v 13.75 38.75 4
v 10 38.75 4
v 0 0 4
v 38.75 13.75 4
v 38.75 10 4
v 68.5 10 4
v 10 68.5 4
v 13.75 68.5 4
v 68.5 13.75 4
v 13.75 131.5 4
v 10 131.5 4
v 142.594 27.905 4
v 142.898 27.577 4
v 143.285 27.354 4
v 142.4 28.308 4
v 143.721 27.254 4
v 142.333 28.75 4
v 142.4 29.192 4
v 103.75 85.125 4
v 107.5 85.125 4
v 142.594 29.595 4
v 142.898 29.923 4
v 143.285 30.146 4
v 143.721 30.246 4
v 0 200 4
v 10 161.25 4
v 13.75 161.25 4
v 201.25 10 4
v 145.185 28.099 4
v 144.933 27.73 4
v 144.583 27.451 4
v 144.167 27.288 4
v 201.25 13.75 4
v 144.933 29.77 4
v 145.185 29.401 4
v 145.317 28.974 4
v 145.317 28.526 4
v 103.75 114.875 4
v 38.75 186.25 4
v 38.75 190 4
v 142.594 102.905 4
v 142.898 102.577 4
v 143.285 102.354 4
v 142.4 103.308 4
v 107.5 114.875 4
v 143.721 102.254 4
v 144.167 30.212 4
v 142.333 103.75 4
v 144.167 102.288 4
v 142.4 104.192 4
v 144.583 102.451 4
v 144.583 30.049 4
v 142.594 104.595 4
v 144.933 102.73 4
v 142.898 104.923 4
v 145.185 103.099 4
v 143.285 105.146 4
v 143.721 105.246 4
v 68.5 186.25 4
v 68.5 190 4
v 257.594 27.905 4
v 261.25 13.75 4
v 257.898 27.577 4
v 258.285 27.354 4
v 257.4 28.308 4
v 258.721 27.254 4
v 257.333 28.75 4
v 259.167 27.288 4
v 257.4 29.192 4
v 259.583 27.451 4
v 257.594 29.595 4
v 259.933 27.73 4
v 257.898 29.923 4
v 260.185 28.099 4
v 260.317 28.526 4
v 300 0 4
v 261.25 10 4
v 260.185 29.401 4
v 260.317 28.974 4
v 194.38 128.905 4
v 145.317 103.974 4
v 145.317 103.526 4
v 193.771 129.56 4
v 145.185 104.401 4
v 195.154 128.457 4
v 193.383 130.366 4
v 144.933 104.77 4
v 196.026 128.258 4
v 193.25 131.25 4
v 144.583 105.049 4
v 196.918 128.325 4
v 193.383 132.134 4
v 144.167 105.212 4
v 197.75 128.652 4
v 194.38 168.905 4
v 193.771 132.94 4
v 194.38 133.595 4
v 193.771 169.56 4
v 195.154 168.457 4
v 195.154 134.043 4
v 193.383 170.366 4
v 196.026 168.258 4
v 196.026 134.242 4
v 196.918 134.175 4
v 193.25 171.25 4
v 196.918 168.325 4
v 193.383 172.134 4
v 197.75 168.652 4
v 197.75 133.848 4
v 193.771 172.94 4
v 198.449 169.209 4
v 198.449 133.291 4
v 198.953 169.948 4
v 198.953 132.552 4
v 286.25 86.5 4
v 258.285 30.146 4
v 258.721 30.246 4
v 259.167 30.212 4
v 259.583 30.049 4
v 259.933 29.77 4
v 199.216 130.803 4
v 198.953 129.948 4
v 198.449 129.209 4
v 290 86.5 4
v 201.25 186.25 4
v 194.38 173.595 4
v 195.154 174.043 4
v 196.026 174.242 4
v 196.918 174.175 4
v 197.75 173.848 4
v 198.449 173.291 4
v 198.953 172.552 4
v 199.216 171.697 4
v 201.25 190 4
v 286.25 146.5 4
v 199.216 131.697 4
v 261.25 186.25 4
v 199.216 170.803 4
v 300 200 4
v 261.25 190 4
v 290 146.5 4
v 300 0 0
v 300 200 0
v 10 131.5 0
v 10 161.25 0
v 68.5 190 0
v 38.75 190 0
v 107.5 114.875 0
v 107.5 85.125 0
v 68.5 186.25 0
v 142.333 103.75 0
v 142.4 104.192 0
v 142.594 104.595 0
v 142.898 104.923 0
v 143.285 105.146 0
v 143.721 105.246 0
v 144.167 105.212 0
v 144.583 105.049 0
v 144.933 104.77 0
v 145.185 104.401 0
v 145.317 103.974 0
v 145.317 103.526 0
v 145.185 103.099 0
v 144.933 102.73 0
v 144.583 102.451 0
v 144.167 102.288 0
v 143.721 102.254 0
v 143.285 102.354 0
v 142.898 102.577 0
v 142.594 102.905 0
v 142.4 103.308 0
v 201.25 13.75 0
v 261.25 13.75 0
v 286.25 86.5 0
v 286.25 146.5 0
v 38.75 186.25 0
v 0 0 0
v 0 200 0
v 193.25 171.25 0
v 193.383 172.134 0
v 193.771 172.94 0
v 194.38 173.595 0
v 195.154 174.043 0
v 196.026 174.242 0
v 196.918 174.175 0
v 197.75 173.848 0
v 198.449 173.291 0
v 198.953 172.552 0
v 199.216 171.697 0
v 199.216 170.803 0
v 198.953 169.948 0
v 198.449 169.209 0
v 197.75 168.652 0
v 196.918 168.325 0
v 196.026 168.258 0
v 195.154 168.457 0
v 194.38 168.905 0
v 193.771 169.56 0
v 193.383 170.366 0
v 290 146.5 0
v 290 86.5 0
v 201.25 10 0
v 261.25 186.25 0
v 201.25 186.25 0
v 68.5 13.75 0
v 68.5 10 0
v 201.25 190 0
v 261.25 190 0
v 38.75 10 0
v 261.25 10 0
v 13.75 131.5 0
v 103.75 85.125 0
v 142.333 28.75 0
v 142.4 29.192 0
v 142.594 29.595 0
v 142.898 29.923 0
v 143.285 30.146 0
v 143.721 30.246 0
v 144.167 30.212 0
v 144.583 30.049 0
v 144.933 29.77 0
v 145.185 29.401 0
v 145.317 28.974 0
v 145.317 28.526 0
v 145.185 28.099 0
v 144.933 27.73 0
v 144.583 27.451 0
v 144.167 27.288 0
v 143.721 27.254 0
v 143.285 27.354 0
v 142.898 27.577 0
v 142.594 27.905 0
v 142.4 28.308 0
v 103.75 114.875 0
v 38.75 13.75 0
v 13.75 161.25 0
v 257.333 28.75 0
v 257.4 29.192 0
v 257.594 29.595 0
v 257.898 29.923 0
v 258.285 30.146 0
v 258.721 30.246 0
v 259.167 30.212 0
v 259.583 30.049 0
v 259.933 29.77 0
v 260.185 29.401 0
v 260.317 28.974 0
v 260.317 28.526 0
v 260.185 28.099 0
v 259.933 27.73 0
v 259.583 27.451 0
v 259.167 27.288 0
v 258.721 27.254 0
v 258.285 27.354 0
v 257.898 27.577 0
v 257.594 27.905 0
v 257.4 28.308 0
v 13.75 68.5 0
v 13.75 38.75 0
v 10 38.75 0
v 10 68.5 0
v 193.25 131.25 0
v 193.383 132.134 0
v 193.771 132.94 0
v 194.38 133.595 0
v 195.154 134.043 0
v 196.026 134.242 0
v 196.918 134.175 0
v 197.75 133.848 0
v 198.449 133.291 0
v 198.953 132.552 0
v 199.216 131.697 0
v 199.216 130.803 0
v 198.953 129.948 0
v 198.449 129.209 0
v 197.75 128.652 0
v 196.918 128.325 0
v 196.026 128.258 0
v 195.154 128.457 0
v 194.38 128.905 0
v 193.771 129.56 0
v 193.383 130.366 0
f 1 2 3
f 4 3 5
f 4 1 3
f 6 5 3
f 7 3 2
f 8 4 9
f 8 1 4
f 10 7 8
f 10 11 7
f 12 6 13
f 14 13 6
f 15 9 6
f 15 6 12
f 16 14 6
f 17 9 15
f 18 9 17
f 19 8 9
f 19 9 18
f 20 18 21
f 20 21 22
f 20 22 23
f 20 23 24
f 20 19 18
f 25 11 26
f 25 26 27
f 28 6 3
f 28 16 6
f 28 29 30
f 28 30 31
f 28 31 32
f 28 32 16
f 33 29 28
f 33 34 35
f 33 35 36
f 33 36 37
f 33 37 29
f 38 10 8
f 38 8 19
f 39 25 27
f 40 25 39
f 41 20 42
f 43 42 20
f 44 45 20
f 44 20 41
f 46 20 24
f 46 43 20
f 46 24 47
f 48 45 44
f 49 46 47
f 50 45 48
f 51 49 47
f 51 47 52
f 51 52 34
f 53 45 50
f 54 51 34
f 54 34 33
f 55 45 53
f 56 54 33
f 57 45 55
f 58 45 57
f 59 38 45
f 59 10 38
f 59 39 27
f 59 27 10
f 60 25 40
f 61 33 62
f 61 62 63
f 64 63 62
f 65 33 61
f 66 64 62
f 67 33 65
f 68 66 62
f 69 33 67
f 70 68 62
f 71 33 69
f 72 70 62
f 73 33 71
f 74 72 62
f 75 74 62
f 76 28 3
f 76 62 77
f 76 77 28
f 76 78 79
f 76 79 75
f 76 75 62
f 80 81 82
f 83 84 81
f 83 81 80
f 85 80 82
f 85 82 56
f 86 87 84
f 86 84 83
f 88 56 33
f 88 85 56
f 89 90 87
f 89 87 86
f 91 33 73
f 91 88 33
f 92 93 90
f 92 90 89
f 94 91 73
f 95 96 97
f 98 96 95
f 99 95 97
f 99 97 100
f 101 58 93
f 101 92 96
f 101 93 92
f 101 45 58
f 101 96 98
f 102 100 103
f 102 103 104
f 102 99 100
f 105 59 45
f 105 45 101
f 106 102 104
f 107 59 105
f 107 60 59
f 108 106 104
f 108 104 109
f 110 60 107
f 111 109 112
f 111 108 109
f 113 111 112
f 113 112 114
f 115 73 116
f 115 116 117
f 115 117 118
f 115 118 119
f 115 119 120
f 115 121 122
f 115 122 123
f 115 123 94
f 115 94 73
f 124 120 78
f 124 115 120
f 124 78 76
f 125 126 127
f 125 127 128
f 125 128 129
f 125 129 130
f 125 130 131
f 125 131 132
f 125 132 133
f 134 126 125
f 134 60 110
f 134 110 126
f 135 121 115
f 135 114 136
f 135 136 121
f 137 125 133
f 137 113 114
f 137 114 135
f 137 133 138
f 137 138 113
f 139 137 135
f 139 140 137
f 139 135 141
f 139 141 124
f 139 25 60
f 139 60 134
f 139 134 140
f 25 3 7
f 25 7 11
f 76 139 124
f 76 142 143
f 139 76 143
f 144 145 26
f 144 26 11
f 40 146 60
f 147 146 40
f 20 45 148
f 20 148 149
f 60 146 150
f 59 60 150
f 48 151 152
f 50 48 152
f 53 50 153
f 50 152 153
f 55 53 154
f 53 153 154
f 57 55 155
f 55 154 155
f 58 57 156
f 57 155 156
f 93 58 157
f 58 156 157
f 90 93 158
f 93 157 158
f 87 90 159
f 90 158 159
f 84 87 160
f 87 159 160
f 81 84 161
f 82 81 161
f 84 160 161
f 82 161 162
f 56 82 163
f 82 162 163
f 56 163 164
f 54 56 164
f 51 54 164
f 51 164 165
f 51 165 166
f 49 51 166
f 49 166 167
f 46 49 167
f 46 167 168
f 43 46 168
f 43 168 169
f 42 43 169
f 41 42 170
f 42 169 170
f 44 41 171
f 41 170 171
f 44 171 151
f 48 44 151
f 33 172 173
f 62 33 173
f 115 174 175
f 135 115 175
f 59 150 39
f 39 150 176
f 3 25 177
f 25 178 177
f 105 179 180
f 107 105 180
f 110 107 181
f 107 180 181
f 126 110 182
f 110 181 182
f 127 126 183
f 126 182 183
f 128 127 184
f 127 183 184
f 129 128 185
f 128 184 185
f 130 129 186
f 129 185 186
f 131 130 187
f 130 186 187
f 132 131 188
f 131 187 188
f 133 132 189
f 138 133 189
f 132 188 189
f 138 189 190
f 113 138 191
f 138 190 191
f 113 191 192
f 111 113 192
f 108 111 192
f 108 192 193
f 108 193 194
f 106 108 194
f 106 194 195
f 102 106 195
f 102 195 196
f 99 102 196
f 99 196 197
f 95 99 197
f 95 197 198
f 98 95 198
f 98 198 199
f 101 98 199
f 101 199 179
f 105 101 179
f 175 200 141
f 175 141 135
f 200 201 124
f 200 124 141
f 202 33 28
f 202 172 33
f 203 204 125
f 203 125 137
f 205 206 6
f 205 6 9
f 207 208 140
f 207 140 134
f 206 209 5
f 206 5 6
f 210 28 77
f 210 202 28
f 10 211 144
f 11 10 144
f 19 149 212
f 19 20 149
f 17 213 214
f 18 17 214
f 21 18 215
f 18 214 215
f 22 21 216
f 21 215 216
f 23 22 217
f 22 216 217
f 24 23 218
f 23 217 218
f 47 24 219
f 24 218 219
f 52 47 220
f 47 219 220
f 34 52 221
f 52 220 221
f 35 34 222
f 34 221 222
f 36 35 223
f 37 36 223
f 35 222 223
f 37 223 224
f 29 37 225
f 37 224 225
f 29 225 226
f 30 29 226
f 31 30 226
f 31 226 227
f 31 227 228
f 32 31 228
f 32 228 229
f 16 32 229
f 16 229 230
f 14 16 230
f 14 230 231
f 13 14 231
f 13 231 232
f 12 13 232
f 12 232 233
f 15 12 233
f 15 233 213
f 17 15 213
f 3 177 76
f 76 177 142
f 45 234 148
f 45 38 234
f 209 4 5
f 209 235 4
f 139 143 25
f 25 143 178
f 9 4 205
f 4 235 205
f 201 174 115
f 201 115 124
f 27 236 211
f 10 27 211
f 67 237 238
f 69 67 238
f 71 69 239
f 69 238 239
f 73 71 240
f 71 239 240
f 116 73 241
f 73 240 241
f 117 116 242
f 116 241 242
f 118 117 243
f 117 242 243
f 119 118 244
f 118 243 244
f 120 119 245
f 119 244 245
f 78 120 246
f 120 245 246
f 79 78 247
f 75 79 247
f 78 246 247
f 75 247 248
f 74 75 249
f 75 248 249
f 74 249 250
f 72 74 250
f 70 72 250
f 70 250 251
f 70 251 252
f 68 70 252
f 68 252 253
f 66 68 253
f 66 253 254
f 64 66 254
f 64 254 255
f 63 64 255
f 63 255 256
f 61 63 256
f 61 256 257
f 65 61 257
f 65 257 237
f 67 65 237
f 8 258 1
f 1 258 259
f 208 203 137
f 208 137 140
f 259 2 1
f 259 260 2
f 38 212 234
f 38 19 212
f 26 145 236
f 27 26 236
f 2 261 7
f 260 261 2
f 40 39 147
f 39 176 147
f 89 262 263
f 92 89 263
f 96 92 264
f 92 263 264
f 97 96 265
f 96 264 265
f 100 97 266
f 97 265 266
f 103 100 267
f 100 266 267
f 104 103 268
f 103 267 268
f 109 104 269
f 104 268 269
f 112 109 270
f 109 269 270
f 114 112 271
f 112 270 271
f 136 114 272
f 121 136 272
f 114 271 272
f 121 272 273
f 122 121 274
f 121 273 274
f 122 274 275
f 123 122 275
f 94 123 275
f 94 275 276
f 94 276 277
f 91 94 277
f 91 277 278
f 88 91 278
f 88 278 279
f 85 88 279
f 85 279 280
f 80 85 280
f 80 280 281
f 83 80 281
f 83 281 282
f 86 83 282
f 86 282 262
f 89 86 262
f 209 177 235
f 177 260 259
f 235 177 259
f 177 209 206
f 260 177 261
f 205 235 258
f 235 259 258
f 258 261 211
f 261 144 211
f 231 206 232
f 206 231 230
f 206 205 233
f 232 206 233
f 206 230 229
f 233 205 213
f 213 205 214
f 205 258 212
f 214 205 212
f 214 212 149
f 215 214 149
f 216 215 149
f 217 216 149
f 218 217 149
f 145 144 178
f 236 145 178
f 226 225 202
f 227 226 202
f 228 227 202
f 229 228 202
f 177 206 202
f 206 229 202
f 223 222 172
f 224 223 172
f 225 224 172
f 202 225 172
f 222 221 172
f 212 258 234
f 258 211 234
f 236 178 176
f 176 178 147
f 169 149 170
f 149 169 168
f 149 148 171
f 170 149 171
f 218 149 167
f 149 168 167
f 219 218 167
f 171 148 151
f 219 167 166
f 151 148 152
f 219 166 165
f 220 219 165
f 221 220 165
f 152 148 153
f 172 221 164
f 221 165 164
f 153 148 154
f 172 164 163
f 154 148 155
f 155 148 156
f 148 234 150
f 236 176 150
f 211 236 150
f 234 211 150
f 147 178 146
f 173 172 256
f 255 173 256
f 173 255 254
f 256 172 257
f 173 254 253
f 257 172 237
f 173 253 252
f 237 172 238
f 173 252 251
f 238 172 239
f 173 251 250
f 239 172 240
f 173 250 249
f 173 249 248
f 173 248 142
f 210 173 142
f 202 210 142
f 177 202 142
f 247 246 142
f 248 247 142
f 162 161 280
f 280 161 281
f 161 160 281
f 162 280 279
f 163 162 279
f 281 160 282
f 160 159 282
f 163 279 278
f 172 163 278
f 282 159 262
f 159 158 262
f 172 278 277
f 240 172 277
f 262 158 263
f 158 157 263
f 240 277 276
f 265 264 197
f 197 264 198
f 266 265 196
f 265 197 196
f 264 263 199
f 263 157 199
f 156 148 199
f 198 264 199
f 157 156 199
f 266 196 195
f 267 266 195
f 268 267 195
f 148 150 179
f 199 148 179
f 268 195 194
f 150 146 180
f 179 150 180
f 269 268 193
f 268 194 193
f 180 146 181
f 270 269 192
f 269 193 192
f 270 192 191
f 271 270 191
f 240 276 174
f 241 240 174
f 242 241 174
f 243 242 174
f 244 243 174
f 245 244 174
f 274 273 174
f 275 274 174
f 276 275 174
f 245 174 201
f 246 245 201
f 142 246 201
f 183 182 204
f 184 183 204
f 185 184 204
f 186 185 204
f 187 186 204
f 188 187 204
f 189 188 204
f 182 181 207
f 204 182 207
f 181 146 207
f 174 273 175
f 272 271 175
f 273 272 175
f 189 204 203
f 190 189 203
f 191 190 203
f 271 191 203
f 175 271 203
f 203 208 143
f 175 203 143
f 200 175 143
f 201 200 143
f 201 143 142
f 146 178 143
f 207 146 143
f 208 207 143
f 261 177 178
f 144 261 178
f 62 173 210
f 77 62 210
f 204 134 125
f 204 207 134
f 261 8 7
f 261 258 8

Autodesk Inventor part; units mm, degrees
ref_plane "YZ Plane" through (0, 0, 0) normal (1, 0, 0) x (0, 1, 0)
ref_plane "XZ Plane" through (0, 0, 0) normal (0, 1, 0) x (-1, 0, 0)
ref_plane "XY Plane" through (0, 0, 0) normal (0, 0, 1) x (1, 0, 0)
sketch "Sketch1" plane through (0, 0, 0) normal (0, 0, 1) x (1, 0, 0)
  line L0 (0, 0) -> (300, 0)
  line L1 (300, 0) -> (300, 200)
  line L2 (300, 200) -> (0, 200)
  line L3 (0, 200) -> (0, 0)
  line L4 (10, 10) -> (290, 10)
  line L5 (290, 10) -> (290, 190)
  line L6 (290, 190) -> (10, 190)
  line L7 (10, 190) -> (10, 10)
  line L8 (13.75, 13.75) -> (286.25, 13.75)
  line L9 (286.25, 13.75) -> (286.25, 186.25)
  line L10 (286.25, 186.25) -> (13.75, 186.25)
  line L11 (13.75, 186.25) -> (13.75, 13.75)
  line L12 (38.75, 190) -> (68.5, 190)
  line L13 (68.5, 190) -> (68.5, 186.25)
  line L14 (68.5, 186.25) -> (38.75, 186.25)
  line L15 (38.75, 186.25) -> (38.75, 190)
  line L16 (10, 161.25) -> (13.75, 161.25)
  line L17 (13.75, 161.25) -> (13.75, 131.5)
  line L18 (13.75, 131.5) -> (10, 131.5)
  line L19 (10, 131.5) -> (10, 161.25)
  line L20 (0, 0) -> (150, 0)
  line L21 (150, 0) -> (150, 100)
  line L22 (150, 100) -> (0, 100)
  line L23 (0, 100) -> (0, 0)
  line L24 (38.75, 10) -> (68.5, 10)
  line L25 (68.5, 10) -> (68.5, 13.75)
  line L26 (68.5, 13.75) -> (38.75, 13.75)
  line L27 (38.75, 13.75) -> (38.75, 10)
  line L28 (10, 38.75) -> (13.75, 38.75)
  line L29 (13.75, 38.75) -> (13.75, 68.5)
  line L30 (13.75, 68.5) -> (10, 68.5)
  line L31 (10, 68.5) -> (10, 38.75)
  line L32 (150, 200) -> (150, 100)
  line L33 (300, 200) -> (300, 0)
  line L34 (261.25, 190) -> (231.5, 190)
  line L35 (231.5, 190) -> (231.5, 186.25)
  line L36 (231.5, 186.25) -> (261.25, 186.25)
  line L37 (261.25, 186.25) -> (261.25, 190)
  line L38 (290, 161.25) -> (286.25, 161.25)
  line L39 (286.25, 161.25) -> (286.25, 131.5)
  line L40 (286.25, 131.5) -> (290, 131.5)
  line L41 (290, 131.5) -> (290, 161.25)
  line L42 (300, 100) -> (300, 0)
  line L43 (261.25, 13.75) -> (261.25, 10)
  line L44 (231.5, 10) -> (231.5, 13.75)
  line L45 (231.5, 13.75) -> (261.25, 13.75)
  line L46 (261.25, 10) -> (231.5, 10)
  line L47 (286.25, 68.5) -> (290, 68.5)
  line L48 (290, 38.75) -> (286.25, 38.75)
  line L49 (290, 68.5) -> (290, 38.75)
  line L50 (286.25, 38.75) -> (286.25, 68.5)
  point P0 (13.75, 161.25)
  point P1 (10, 131.5)
  point P2 (10, 68.5)
  point P3 (13.75, 68.5)
  point P4 (13.75, 38.75)
  point P5 (10, 38.75)
  point P6 (68.5, 13.75)
  point P7 (68.5, 10)
  point P8 (38.75, 10)
  point P9 (38.75, 13.75)
  point P10 (231.5, 186.25)
  point P11 (231.5, 190)
  point P12 (261.25, 190)
  point P13 (261.25, 186.25)
  point P14 (286.25, 131.5)
  point P15 (286.25, 161.25)
  point P16 (290, 161.25)
  point P17 (261.25, 13.75)
  point P18 (261.25, 10)
  point P19 (231.5, 10)
  point P20 (231.5, 13.75)
  point P21 (286.25, 68.5)
  point P22 (286.25, 38.75)
  point P23 (68.5, 190)
  dimension "d0" = 300
  dimension "d1" = 200
  dimension "d2" = 280
  dimension "d3" = 180
  dimension "d4" = 10
  dimension "d5" = 10
  dimension "d6" = 3.75
  dimension "d7" = 3.75
  dimension "d8" = 3.75
  dimension "d9" = 3.75
  dimension "d10" = 25
  dimension "d11" = 29.75
  dimension "d12" = 29.75
  dimension "d13" = 25
  dimension "d14" = 100
  dimension "d15" = 150
extrude "Extrusion1" add sketch "Sketch1" along normal blind 4 contours L3 L22 L7 L4 L21 L0 | L21 L4 L5 L6 L32 L2 L1 L0 | L3 L2 L32 L6 L7 L22 | L21 L8 L44 L4 | L4 L25 L8 L21 | L22 L11 L30 L7 | L7 L18 L11 L22 | L21 L32 L10 L9 L8 | L8 L11 L22 L21 | L11 L10 L32 L22 | L4 L7 L28 L11 L8 L27 | L43 L8 L9 L48 L5 L4 | L32 L10 L13 L6 | L6 L35 L10 L32 | L7 L6 L15 L10 L11 L16 | L6 L5 L38 L9 L10 L37 | L47 L9 L40 L5
sketch "Sketch5" plane through (0, 0, 4) normal (0, 0, 1) x (1, 0, 0)
  line L0 (103.75, 114.875) -> (107.5, 114.875)
  line L1 (107.5, 114.875) -> (107.5, 85.125)
  line L2 (107.5, 85.125) -> (103.75, 85.125)
  line L3 (103.75, 85.125) -> (103.75, 114.875)
  line L4 (13.75, 68.5) -> (13.75, 38.75) projected
  line L5 (0, 0) -> (300, 0) projected
  point P0 (107.5, 100)
  dimension "d53" = 3.75
  dimension "d54" = 29.75
  dimension "d55" = 90
  dimension "d56" = 100
extrude "Extrusion5" cut sketch "Sketch5" against normal through all
sketch "Sketch6" plane through (0, 0, 0) normal (0, 0, -1) x (-1, 0, 0)
  circle A0 centre (-258.8334, 28.75) radius 1.5
  circle A1 centre (-143.8334, 28.75) radius 1.5
  circle A2 centre (-143.8334, 103.75) radius 1.5
  line L0 (-300, 0) -> (-300, 200) projected
  line L1 (-231.5, 13.75) -> (-261.25, 13.75) projected
  circle A3 centre (-196.25, 171.25) radius 3
  circle A4 centre (-196.25, 131.25) radius 3
  line L2 (-286.25, 131.5) -> (-286.25, 161.25) projected
  line L3 (-261.25, 186.25) -> (-231.5, 186.25) projected
  point P0 (0, 0)
  dimension "d59" = 41.1666
  dimension "d60" = 115
  dimension "d61" = 75
  dimension "d62" = 0
  dimension "d63" = 3
  dimension "d64" = 3
  dimension "d65" = 3
  dimension "d66" = 15
  dimension "d67" = 15
  dimension "d70" = 40
  dimension "d71" = 6
  dimension "d72" = 6
  dimension "d73" = 90
  dimension "d74" = 90
  dimension "d75" = 15
extrude "Extrusion6" cut sketch "Sketch6" against normal through all
sketch "Sketch7" plane through (0, 0, 0) normal (0, 0, -1) x (-1, 0, 0)
  line L0 (-290, 146.5) -> (-286.25, 146.5)
  line L1 (-286.25, 146.5) -> (-286.25, 86.5)
  line L2 (-286.25, 86.5) -> (-290, 86.5)
  line L3 (-290, 86.5) -> (-290, 146.5)
  line L4 (-290, 161.25) -> (-290, 131.5) projected
  line L5 (-286.25, 131.5) -> (-286.25, 161.25) projected
  line L6 (-290, 131.5) -> (-286.25, 131.5) projected
  line L7 (-290, 68.5) -> (-290, 38.75) projected
  line L8 (-286.25, 38.75) -> (-286.25, 68.5) projected
  line L9 (-290, 68.5) -> (-286.25, 68.5)
  line L10 (-286.25, 68.5) -> (-286.25, 38.75)
  line L11 (-286.25, 38.75) -> (-290, 38.75)
  line L12 (-290, 38.75) -> (-290, 68.5)
  line L13 (-290, 161.25) -> (-290, 131.5) projected
  line L14 (-290, 161.25) -> (-286.25, 161.25)
  line L15 (-286.25, 161.25) -> (-286.25, 146.5)
  line L16 (-286.25, 146.5) -> (-290, 146.5)
  line L17 (-290, 146.5) -> (-290, 161.25)
  point P0 (0, 0)
  dimension "d79" = 0
  dimension "d80" = 0
  dimension "d81" = 15
  dimension "d82" = 60
extrude "Extrusion7" add sketch "Sketch7" against normal blind 4 contours L4 L14 L5 L0 | L9 L8 L11 L7
extrude "Extrusion8" cut sketch "Sketch7" against normal through all contours L0 L1 L6 L3 | L6 L1 L2 L3
sketch "Sketch8" plane through (0, 0, 0) normal (0, 0, -1) x (-1, 0, 0)
  line L0 (-261.25, 190) -> (-261.25, 186.25) projected
  line L1 (-261.25, 190) -> (-201.25, 190)
  line L2 (-201.25, 190) -> (-201.25, 186.25)
  line L3 (-201.25, 186.25) -> (-261.25, 186.25)
  line L4 (-261.25, 186.25) -> (-261.25, 190)
  line L5 (-261.25, 13.75) -> (-261.25, 10) projected
  line L6 (-261.25, 13.75) -> (-201.25, 13.75)
  line L7 (-201.25, 13.75) -> (-201.25, 10)
  line L8 (-201.25, 10) -> (-261.25, 10)
  line L9 (-261.25, 10) -> (-261.25, 13.75)
  point P0 (0, 0)
  dimension "d87" = 60
  dimension "d88" = 3.75
  dimension "d89" = 3.75
extrude "Extrusion9" cut sketch "Sketch8" against normal through all
properties part number "onderstuk_8AUG"
